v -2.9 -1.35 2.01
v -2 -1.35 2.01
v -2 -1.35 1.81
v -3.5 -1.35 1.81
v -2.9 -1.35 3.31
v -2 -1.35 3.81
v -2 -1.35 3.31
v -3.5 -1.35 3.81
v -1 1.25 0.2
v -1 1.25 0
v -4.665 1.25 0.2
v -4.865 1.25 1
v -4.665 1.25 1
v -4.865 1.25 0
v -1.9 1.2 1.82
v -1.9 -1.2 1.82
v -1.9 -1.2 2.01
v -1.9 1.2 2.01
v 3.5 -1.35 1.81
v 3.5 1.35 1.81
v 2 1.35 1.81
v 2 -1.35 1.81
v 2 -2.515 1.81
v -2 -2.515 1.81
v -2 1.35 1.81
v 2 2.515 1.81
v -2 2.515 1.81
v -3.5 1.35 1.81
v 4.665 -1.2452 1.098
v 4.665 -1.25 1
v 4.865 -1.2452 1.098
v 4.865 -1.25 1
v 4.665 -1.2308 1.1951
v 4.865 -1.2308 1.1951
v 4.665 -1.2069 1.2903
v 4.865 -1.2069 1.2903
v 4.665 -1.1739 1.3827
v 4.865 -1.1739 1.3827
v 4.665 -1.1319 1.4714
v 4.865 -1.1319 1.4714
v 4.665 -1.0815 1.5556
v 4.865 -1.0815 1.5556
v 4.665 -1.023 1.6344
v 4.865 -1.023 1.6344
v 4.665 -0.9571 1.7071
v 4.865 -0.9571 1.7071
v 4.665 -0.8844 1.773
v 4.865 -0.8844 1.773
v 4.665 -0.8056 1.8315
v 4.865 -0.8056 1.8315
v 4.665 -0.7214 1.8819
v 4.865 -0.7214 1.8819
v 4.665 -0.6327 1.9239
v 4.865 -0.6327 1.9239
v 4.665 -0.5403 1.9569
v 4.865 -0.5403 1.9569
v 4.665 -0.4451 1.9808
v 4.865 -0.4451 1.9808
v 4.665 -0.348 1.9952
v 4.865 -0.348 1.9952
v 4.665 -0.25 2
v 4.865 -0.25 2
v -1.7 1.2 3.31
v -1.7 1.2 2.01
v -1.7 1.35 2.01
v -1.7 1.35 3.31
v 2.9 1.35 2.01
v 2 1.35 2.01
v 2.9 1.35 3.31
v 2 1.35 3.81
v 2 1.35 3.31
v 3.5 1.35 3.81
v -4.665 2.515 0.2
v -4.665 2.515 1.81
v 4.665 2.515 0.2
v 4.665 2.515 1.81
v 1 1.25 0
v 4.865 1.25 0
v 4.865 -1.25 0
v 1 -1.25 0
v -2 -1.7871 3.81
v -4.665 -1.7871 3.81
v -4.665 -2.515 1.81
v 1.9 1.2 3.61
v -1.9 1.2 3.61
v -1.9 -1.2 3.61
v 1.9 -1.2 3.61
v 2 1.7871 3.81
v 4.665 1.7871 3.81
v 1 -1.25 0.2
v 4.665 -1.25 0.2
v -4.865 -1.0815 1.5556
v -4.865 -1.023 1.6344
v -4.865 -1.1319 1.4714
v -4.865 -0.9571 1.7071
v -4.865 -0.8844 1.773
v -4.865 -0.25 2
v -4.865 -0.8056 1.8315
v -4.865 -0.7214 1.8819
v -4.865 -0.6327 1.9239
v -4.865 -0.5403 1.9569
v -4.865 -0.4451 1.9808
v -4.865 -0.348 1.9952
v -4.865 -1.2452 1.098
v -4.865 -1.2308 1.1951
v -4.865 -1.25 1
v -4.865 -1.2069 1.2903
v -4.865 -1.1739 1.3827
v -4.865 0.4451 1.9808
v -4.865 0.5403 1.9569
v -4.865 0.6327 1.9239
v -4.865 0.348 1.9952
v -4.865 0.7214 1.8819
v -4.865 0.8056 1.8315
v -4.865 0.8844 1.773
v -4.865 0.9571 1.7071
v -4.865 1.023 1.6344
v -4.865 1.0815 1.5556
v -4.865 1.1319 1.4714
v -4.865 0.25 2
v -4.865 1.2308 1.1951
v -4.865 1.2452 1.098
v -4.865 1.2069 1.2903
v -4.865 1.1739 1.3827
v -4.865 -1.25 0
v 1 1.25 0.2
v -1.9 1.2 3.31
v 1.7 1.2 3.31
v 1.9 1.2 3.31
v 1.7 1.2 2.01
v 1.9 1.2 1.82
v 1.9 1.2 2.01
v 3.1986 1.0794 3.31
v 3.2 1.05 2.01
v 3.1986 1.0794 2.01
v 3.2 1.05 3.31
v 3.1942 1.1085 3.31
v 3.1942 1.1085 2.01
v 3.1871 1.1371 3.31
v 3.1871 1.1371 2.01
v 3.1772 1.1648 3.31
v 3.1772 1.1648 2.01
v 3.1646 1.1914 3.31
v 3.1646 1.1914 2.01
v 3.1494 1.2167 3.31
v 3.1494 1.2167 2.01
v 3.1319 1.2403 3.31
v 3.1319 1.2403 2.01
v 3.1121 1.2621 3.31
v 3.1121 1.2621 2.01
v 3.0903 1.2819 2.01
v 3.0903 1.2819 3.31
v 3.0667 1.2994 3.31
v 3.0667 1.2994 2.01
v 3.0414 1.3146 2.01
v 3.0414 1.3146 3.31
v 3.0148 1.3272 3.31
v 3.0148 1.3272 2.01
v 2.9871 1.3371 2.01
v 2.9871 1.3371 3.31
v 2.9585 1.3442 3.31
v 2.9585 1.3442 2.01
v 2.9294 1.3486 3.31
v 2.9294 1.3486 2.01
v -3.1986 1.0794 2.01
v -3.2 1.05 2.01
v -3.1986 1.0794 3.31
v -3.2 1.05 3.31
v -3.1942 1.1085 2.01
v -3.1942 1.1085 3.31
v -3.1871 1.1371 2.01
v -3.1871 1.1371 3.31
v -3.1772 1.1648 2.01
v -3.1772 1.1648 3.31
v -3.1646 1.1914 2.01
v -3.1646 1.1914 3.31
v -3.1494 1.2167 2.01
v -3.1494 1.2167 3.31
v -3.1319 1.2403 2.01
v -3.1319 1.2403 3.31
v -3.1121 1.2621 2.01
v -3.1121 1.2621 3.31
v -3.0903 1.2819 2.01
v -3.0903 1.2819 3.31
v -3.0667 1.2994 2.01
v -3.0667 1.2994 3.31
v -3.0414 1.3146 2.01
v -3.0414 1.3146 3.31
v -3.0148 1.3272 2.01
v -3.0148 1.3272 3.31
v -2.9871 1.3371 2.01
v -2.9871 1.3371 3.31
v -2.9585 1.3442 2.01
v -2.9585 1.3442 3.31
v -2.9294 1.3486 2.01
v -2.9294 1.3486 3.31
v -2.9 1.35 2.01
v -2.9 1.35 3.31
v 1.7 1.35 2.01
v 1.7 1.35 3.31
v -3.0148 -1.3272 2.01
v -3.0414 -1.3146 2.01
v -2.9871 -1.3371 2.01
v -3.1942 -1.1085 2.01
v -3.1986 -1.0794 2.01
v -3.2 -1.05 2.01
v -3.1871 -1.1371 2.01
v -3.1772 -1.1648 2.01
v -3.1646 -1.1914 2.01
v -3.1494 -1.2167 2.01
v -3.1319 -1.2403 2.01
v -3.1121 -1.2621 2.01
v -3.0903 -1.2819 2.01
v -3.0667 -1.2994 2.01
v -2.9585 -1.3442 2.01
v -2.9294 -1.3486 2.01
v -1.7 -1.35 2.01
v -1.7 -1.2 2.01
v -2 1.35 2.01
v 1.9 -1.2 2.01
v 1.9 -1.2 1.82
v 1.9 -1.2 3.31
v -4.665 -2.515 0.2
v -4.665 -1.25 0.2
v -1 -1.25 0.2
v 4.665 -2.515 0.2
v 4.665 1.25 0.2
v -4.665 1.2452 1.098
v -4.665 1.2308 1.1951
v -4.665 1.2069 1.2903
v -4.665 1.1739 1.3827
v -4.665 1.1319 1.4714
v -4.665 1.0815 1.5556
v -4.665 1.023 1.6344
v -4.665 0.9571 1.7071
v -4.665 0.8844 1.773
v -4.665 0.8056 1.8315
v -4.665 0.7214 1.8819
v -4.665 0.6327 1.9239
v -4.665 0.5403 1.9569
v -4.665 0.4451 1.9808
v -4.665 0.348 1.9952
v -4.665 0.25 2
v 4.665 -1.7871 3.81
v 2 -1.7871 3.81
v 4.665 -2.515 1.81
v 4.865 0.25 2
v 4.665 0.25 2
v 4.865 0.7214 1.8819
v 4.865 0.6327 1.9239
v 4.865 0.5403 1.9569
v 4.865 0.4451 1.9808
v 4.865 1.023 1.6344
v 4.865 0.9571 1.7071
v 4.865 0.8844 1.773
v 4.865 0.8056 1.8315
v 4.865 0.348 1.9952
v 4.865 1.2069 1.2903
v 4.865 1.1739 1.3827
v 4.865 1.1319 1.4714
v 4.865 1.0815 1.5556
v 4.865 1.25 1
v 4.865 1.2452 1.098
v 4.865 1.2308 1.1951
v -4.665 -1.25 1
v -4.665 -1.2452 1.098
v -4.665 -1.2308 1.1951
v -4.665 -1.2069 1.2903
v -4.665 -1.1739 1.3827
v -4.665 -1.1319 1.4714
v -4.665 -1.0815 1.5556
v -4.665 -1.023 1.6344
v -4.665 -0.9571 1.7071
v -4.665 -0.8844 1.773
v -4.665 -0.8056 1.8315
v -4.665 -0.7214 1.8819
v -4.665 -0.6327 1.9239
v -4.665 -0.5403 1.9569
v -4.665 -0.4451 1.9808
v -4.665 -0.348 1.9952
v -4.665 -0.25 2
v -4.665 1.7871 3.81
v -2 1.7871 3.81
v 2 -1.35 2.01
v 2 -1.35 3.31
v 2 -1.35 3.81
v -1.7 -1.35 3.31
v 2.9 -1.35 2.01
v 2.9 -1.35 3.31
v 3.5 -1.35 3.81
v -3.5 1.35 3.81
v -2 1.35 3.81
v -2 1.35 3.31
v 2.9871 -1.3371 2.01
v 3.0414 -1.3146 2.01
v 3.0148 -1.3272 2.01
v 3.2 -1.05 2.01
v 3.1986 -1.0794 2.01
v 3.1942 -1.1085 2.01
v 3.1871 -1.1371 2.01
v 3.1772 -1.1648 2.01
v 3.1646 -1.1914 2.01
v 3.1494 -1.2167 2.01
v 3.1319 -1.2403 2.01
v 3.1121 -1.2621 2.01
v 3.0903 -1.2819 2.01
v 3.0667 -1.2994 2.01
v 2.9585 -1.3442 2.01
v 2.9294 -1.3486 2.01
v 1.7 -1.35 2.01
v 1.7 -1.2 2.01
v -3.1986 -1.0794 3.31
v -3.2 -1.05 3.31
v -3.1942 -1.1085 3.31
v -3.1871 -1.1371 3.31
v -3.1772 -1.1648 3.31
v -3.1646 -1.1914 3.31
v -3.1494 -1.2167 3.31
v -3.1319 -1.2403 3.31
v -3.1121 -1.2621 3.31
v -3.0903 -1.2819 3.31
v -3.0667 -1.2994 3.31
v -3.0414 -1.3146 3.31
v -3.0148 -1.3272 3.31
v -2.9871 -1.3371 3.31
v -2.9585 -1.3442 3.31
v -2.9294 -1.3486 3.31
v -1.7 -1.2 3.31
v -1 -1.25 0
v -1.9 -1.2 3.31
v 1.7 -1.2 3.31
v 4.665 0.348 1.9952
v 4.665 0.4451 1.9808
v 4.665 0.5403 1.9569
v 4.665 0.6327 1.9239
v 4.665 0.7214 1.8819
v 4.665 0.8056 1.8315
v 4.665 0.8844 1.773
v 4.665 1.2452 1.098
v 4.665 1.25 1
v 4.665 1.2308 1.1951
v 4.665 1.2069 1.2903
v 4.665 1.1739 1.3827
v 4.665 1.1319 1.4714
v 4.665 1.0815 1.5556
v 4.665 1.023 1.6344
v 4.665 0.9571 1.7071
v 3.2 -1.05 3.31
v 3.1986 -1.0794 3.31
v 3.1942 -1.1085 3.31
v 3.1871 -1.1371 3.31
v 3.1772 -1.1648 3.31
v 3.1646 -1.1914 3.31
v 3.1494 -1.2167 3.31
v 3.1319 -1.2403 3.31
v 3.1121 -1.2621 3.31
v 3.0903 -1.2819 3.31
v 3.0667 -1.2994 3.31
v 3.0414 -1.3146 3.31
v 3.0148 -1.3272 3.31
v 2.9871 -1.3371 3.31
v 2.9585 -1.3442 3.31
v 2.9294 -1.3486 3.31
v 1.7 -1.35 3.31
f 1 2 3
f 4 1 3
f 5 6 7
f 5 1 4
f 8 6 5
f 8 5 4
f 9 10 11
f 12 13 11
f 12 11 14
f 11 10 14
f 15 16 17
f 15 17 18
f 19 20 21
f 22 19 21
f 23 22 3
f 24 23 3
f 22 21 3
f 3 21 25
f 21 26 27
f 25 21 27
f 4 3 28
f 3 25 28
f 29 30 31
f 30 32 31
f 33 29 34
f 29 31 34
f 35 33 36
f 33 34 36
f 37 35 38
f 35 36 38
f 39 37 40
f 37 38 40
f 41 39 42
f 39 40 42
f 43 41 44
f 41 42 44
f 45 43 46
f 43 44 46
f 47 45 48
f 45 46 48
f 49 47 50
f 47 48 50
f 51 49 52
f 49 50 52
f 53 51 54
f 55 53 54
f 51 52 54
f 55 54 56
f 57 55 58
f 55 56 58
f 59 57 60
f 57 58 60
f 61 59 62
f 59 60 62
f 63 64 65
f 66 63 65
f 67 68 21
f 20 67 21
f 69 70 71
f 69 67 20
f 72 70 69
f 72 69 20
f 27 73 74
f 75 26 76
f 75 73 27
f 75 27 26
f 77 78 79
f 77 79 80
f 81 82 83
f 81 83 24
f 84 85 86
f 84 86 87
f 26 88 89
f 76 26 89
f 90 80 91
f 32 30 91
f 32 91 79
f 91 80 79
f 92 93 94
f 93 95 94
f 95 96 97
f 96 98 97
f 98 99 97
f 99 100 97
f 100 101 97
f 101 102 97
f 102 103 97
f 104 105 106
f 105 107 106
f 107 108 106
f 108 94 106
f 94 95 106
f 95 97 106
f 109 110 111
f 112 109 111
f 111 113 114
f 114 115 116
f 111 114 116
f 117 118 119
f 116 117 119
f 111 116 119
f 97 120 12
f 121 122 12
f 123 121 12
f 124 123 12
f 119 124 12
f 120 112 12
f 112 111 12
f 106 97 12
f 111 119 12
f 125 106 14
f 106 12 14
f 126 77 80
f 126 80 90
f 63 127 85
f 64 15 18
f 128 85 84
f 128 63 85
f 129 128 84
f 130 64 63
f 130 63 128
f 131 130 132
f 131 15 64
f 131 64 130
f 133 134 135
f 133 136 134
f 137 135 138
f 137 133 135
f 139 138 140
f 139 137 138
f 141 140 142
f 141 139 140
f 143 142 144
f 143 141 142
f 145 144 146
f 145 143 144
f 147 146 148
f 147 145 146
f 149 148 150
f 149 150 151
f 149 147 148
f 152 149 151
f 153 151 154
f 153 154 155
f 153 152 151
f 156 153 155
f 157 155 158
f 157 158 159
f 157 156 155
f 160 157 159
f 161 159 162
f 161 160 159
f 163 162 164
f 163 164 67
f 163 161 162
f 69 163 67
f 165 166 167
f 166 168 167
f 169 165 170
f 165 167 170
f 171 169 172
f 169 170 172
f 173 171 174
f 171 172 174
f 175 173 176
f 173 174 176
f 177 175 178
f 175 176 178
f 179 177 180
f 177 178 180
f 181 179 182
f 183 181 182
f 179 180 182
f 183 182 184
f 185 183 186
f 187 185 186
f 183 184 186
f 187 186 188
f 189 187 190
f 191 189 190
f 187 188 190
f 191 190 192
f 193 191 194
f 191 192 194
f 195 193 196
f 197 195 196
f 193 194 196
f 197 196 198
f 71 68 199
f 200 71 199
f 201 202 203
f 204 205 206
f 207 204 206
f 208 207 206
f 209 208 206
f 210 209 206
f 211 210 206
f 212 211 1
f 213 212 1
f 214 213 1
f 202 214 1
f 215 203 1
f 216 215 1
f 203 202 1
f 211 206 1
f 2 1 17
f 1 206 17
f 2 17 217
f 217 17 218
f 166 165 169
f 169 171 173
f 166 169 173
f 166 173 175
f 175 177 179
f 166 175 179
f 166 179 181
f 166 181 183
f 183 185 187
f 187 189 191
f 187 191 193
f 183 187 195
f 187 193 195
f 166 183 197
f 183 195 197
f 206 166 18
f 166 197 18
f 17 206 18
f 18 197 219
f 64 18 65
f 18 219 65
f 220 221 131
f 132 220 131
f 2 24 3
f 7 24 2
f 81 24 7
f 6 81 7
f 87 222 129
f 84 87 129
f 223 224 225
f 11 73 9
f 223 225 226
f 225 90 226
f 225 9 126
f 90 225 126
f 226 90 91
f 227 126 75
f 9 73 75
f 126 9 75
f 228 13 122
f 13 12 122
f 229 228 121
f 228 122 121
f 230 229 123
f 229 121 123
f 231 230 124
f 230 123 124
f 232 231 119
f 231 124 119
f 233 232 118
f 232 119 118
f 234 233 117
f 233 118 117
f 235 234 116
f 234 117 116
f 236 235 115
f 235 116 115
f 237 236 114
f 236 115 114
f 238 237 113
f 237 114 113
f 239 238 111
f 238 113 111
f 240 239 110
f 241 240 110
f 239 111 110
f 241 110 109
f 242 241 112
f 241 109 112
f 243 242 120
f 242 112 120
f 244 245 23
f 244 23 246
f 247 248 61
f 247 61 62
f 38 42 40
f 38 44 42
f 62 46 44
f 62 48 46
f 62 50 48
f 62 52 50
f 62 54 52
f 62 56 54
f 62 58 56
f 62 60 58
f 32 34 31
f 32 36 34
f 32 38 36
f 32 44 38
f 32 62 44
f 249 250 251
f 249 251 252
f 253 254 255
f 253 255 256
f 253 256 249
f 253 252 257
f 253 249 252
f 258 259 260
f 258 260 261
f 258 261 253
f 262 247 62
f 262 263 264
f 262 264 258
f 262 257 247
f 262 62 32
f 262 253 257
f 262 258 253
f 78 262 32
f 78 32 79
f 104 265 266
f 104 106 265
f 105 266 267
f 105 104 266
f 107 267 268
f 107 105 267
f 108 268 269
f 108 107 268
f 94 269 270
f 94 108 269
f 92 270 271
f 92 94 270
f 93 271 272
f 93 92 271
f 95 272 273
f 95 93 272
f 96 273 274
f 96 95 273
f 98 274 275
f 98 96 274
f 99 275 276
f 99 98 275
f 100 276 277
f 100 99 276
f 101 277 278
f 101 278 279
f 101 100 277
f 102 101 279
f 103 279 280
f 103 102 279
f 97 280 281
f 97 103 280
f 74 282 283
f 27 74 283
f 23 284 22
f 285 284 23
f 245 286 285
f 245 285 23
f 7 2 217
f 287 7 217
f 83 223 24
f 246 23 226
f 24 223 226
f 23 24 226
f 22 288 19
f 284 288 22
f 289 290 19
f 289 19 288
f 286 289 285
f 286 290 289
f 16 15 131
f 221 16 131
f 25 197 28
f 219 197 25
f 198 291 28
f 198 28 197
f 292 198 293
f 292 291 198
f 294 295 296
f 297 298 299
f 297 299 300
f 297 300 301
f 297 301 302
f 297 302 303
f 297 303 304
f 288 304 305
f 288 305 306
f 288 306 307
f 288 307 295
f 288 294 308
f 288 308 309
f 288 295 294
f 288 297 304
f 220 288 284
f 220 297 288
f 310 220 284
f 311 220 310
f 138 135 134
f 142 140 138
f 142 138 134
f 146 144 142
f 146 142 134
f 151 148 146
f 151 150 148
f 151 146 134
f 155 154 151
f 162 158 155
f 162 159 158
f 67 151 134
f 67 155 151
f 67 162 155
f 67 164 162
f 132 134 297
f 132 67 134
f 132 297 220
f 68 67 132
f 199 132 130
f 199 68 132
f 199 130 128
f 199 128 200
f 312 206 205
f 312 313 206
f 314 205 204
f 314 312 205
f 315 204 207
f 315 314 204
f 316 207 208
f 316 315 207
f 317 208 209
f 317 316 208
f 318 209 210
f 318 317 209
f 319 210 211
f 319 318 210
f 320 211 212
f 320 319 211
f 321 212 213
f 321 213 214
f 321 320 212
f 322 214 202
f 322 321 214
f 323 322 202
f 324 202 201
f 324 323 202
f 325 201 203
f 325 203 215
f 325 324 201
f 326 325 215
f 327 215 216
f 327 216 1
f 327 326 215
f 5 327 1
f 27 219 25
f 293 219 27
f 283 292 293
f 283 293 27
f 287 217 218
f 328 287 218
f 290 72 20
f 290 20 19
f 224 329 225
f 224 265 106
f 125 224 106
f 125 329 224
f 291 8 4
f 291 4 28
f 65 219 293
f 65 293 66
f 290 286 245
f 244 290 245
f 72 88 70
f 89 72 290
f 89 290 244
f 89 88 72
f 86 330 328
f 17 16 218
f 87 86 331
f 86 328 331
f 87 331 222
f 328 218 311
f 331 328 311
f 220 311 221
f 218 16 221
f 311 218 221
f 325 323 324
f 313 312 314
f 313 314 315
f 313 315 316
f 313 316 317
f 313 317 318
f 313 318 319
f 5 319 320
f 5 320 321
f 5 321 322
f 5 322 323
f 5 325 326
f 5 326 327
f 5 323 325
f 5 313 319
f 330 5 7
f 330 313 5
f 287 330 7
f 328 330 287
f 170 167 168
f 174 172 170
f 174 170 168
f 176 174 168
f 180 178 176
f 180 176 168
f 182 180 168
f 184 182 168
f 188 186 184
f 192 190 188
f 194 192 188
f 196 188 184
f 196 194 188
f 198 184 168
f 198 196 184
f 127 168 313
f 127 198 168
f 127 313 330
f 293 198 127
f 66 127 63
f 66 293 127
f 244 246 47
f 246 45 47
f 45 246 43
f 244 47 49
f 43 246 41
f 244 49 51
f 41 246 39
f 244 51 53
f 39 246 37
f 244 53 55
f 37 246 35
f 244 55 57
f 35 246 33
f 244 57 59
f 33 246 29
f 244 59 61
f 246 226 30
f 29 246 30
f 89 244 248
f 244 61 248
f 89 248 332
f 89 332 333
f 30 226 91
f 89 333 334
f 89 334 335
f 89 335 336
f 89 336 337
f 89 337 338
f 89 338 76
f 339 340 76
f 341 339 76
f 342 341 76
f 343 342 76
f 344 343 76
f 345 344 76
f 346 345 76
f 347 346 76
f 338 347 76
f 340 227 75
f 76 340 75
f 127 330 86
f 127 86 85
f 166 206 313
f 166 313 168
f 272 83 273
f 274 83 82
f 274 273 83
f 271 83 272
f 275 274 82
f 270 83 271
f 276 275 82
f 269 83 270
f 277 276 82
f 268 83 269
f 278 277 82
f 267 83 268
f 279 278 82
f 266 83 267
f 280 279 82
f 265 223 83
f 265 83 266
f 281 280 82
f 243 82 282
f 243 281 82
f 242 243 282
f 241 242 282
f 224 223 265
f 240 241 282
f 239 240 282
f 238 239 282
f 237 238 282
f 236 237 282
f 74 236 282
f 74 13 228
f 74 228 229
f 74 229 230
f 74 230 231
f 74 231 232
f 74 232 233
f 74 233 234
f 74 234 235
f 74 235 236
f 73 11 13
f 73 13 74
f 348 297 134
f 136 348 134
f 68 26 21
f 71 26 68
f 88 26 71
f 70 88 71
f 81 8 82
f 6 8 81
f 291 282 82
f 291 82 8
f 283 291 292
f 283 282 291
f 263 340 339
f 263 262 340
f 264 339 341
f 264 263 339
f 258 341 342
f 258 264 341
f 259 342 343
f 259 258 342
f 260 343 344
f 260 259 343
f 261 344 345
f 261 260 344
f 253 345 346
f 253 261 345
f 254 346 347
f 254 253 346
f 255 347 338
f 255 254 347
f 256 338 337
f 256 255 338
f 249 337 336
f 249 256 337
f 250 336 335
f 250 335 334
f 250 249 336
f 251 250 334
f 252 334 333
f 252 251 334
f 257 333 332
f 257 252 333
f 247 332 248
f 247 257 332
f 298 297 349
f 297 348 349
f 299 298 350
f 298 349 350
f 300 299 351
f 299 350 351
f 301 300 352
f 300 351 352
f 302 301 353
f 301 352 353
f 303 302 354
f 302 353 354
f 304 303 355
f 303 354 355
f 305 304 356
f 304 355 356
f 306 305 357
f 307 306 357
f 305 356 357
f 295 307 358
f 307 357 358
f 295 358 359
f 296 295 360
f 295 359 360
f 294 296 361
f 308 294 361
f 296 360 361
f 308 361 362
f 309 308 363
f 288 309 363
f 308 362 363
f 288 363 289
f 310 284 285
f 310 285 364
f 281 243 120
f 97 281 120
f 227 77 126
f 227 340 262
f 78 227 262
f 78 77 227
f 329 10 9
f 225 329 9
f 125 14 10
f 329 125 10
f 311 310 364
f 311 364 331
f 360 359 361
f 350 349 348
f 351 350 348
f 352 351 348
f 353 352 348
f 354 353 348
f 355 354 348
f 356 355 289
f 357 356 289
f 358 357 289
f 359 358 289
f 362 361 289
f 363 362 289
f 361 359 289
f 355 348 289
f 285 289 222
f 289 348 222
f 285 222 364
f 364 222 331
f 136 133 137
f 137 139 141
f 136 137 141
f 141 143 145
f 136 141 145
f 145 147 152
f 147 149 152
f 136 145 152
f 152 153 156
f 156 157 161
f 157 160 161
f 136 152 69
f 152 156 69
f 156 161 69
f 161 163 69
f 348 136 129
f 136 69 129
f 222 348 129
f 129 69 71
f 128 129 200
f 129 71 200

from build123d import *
from OCP.BRepFilletAPI import BRepFilletAPI_MakeChamfer

# Parameters (mm, degrees)
BOSS_EXTRUDE1_START  = 0.2
SKETCH1_W            = 9.33
SKETCH1_H            = 5.03
BOSS_EXTRUDE1_DEPTH  = 3.61
CUT_EXTRUDE1_DEPTH   = 2
CHAMFER1_SIZE        = 2
CHAMFER1_SIZE2       = 0.727940469
BOSS_EXTRUDE3_DEPTH  = 1.25
FILLET2_R            = 1
FILLET2_OF_MIRROR1_R = 1
BOSS_EXTRUDE4_START  = 0.2
SKETCH7_W            = 1.5
SKETCH7_H            = 2.7
BOSS_EXTRUDE4_DEPTH  = 1.3
FILLET3_R            = 0.3
BOSS_EXTRUDE5_START  = -1.49
SKETCH8_W            = 3.8
SKETCH8_H            = 2.4
BOSS_EXTRUDE5_DEPTH  = 1.79


with BuildPart() as part:
    # Sketch1 → Boss-Extrude1 (new body)
    with BuildSketch(Plane.XY.offset(BOSS_EXTRUDE1_START)):
        Rectangle(SKETCH1_W, SKETCH1_H)
    extrude(amount=BOSS_EXTRUDE1_DEPTH)

    # Sketch2 → Cut-Extrude1 (cut)
    with BuildSketch(Plane.XY.offset(3.81)):
        Polygon((-3.5, 1.35), (-2, 1.35), (-2, 2.515), (2, 2.515), (2, 1.35), (3.5, 1.35), (3.5, -1.35), (2, -1.35), (2, -2.515), (-2, -2.515), (-2, -1.35), (-3.5, -1.35), align=None)
    extrude(amount=-CUT_EXTRUDE1_DEPTH, mode=Mode.SUBTRACT)

    # Chamfer1: one chamfer whose edges measure the first distance from different faces: ONE call of the kernel's chamfer builder (chamfer() names one face for all edges)
    chamfer1_edges_1 = [part.edges().sort_by_distance(p)[0] for p in [
        (-3.3325, 2.515, 3.81),
        (3.3325, 2.515, 3.81),
    ]]
    chamfer1_side_1 = [part.faces().sort_by_distance(p)[0] for p in [
        (0, 2.515, 1.754233878),
    ]]
    chamfer1_edges_2 = [part.edges().sort_by_distance(p)[0] for p in [
        (3.3325, -2.515, 3.81),
        (-3.3325, -2.515, 3.81),
    ]]
    chamfer1_side_2 = [part.faces().sort_by_distance(p)[0] for p in [
        (0, -2.515, 1.754233878),
    ]]
    chamfer1 = BRepFilletAPI_MakeChamfer(part.part.solid().wrapped)
    for e in chamfer1_edges_1:
        chamfer1.Add(CHAMFER1_SIZE, CHAMFER1_SIZE2, e.wrapped, chamfer1_side_1[0].wrapped)  # the first distance lies on this face
    for e in chamfer1_edges_2:
        chamfer1.Add(CHAMFER1_SIZE, CHAMFER1_SIZE2, e.wrapped, chamfer1_side_2[0].wrapped)  # the first distance lies on this face
    add(Compound.cast(chamfer1.Shape()), mode=Mode.REPLACE)

    # Sketch6 → Boss-Extrude3 (add, symmetric)
    with BuildSketch(Plane(origin=(0, 0, 0), x_dir=(1, 0, 0), z_dir=(0, 1, 0))):
        Polygon((4.665, -2), (4.865, -2), (4.865, 0), (1, 0), (1, -0.2), (4.665, -0.2), align=None)
    boss_extrude3 = extrude(amount=BOSS_EXTRUDE3_DEPTH, both=True)

    # Fillet2
    fillet2_edges = [part.edges().sort_by_distance(p)[0] for p in [
        (4.765, -1.25, 2),
        (4.765, 1.25, 2),
    ]]
    fillet(fillet2_edges, radius=FILLET2_R)

    # Mirror1: Boss-Extrude3 across plane
    add(boss_extrude3.mirror(Plane(origin=(0, 0, 0), x_dir=(0, 0, 1), z_dir=(1, 0, 0))))

    # Fillet2 of Mirror1
    fillet2_of_mirror1_edges = [part.edges().sort_by_distance(p)[0] for p in [
        (-4.765, -1.25, 2),
        (-4.765, 1.25, 2),
    ]]
    fillet(fillet2_of_mirror1_edges, radius=FILLET2_OF_MIRROR1_R)



with BuildPart() as body_2:
    # Sketch7 → Boss-Extrude4 (new body)
    with BuildSketch(Plane.XY.offset(1.81).offset(BOSS_EXTRUDE4_START)):
        with Locations((-2.45, 0)):
            Rectangle(SKETCH7_W, SKETCH7_H)
    extrude(amount=BOSS_EXTRUDE4_DEPTH)

    # Fillet3
    fillet3_edges = [body_2.edges().sort_by_distance(p)[0] for p in [
        (-3.2, 1.35, 2.66),
        (-3.2, -1.35, 2.66),
    ]]
    fillet(fillet3_edges, radius=FILLET3_R)


with BuildPart() as body_3:
    # Mirror2: mirrored copy
    add(body_2.part.mirror(Plane(origin=(0, 0, 0), x_dir=(0, 0, 1), z_dir=(1, 0, 0))))


with BuildPart() as part_1:
    add(part.part)

    add(body_2.part)  # Boss-Extrude5 merges body 2

    add(body_3.part)  # Boss-Extrude5 merges body 3
    # Sketch8 → Boss-Extrude5 (add)
    with BuildSketch(Plane.XY.offset(3.31).offset(BOSS_EXTRUDE5_START)):
        Rectangle(SKETCH8_W, SKETCH8_H)
    extrude(amount=BOSS_EXTRUDE5_DEPTH)


solid = part_1.part
